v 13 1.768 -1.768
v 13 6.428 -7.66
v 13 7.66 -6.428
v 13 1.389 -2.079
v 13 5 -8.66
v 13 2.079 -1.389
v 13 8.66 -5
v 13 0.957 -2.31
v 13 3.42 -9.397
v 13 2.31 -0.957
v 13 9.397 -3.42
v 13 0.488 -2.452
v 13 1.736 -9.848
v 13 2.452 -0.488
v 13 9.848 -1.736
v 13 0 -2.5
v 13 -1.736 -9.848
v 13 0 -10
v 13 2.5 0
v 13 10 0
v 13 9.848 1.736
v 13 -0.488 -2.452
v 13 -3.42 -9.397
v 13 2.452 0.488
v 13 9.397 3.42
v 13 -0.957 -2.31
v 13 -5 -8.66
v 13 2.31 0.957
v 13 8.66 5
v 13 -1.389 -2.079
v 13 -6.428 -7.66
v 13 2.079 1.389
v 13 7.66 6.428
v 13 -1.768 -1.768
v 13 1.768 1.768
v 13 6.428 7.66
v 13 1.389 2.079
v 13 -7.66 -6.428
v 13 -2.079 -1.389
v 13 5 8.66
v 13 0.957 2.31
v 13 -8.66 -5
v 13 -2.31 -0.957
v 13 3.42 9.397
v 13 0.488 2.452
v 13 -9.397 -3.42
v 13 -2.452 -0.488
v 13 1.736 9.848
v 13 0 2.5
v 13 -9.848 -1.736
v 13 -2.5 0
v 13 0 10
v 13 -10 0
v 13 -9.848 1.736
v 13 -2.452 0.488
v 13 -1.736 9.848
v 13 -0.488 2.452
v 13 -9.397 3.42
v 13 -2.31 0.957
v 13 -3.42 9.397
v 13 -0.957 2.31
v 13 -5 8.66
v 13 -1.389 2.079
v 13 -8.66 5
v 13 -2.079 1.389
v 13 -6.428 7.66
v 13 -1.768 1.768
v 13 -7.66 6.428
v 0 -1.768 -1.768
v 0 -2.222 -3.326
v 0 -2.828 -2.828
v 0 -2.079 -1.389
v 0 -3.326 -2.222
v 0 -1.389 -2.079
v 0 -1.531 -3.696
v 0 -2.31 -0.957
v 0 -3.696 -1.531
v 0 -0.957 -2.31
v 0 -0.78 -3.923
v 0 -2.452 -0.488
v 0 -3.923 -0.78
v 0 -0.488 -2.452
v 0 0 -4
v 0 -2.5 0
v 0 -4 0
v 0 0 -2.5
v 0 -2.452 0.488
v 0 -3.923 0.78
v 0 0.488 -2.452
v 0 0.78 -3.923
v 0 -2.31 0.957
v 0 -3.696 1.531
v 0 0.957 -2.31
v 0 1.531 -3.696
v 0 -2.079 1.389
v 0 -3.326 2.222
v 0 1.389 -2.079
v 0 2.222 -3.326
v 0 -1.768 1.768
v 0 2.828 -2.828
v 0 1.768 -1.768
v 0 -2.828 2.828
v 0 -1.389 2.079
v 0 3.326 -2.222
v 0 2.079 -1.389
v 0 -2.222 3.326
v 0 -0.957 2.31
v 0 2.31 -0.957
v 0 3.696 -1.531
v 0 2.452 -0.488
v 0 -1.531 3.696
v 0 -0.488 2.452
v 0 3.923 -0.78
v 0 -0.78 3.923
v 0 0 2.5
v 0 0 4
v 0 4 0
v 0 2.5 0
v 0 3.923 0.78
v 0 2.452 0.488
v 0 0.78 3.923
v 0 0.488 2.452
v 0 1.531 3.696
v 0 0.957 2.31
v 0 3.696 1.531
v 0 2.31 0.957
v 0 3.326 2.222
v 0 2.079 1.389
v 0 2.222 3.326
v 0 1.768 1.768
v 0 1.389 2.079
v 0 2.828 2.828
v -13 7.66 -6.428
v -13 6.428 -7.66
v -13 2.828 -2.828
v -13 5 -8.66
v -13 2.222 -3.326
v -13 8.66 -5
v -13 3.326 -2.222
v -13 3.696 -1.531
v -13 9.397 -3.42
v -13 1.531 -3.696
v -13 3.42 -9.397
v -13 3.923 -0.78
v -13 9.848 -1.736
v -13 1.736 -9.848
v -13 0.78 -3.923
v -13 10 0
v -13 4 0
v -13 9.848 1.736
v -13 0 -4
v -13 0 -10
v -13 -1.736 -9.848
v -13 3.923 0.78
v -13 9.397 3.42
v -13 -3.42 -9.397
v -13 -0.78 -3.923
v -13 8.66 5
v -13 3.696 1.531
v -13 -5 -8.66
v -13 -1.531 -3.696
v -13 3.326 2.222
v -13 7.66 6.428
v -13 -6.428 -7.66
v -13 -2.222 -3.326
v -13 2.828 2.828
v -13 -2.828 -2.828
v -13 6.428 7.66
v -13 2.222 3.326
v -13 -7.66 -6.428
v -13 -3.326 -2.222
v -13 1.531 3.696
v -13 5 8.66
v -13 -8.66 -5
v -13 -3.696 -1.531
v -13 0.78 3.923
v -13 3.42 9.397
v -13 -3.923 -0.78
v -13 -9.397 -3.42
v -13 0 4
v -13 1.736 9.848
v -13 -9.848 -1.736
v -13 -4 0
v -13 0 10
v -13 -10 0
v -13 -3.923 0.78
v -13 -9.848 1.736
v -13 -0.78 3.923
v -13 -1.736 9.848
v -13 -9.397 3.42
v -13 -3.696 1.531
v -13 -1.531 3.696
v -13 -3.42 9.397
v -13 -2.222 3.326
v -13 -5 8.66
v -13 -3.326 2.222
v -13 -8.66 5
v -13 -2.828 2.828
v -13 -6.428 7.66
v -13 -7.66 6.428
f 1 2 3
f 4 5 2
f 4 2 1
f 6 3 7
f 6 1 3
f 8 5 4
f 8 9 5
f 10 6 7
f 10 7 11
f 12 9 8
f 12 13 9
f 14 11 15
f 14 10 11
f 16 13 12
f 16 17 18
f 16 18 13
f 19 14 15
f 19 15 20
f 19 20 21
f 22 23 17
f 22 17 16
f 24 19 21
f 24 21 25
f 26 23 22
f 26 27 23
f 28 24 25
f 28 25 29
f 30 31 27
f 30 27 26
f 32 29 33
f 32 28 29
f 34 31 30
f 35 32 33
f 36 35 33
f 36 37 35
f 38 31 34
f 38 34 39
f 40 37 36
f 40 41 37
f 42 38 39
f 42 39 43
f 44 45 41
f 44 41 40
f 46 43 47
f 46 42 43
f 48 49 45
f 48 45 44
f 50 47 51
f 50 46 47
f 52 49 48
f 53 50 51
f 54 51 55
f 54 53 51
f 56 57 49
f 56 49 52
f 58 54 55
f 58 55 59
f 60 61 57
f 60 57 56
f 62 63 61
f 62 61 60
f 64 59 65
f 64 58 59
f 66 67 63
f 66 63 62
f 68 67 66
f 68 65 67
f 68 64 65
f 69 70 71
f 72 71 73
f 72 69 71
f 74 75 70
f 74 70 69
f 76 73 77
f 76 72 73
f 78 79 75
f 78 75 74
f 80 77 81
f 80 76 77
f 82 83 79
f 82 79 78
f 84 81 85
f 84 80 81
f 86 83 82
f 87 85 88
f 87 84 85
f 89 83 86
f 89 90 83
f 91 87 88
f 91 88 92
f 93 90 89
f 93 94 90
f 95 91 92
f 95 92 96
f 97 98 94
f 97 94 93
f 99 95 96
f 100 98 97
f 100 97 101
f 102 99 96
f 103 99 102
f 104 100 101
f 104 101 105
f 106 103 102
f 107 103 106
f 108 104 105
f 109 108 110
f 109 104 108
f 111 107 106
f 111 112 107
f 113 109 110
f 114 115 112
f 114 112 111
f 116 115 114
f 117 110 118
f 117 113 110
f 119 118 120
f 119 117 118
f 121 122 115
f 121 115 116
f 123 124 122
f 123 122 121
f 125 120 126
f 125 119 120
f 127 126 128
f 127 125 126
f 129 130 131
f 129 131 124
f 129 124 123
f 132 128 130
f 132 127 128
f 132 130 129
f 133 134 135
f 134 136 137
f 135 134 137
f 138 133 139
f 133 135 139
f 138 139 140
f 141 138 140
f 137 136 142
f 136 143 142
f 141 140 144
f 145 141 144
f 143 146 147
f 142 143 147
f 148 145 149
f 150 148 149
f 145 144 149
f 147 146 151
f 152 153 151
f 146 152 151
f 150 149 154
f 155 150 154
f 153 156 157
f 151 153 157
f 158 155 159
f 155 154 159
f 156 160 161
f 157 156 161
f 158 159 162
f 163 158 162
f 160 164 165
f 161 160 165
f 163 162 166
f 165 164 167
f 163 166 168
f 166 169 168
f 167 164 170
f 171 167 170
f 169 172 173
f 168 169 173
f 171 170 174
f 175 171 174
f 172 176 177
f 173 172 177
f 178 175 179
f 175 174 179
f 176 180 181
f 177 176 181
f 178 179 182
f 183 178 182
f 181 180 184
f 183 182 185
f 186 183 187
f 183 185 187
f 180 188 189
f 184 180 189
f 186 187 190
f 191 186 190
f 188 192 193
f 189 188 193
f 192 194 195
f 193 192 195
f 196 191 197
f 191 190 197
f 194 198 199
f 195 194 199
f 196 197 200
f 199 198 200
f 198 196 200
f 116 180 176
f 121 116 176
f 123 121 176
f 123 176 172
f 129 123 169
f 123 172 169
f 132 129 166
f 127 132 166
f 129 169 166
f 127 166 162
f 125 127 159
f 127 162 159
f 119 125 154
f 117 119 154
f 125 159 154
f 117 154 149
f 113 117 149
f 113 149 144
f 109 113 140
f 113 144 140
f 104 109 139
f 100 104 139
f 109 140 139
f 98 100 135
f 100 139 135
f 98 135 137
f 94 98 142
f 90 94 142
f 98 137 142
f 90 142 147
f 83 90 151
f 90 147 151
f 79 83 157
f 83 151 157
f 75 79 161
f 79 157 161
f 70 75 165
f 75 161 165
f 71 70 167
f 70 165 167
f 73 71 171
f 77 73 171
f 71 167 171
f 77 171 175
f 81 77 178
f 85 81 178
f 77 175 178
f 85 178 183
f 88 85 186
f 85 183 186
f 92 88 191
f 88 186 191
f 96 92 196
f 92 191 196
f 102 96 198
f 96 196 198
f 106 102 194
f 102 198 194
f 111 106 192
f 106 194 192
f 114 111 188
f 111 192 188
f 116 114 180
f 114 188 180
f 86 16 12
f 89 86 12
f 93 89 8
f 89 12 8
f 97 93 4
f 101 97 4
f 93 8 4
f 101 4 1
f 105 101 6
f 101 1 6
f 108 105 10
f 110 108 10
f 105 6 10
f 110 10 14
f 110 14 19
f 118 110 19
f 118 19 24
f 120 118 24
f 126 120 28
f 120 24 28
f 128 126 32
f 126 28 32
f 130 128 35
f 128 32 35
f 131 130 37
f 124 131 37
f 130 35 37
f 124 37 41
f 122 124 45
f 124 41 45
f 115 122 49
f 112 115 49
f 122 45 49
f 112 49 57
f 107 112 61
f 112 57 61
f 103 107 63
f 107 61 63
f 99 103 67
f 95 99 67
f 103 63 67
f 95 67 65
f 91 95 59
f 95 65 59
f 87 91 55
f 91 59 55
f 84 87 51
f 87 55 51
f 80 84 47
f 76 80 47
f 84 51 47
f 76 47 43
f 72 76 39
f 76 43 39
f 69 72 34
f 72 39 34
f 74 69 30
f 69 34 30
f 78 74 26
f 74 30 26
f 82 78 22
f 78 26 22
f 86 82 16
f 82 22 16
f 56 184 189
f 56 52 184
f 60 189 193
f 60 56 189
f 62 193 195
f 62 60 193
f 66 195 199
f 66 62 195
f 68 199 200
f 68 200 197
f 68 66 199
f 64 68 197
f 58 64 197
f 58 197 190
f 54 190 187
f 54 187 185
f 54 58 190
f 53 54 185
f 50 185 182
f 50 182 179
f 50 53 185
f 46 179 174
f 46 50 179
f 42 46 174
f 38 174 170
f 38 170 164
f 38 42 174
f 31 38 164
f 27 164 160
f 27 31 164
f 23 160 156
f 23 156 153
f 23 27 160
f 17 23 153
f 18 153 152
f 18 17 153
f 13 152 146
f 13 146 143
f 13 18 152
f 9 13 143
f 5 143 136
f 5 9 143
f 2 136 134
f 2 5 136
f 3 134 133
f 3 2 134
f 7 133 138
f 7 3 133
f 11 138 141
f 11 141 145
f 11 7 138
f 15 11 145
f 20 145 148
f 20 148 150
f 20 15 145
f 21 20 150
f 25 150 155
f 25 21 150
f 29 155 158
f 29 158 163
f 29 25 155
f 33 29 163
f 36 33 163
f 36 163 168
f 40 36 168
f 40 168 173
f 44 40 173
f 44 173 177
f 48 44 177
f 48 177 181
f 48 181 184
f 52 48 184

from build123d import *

# Parameters (mm, degrees)
SKETCH1_R           = 10
BOSS_EXTRUDE1_DEPTH = 13
SKETCH2_R           = 2.5
CUT_EXTRUDE1_DEPTH  = 13
SKETCH3_R           = 4
CUT_EXTRUDE2_DEPTH  = 13


with BuildPart() as part:
    # Sketch1 → Boss-Extrude1 (new, symmetric)
    with BuildSketch(Plane(origin=(0, 0, 0), x_dir=(0, 0, -1), z_dir=(1, 0, 0))):
        with Locations(Location((0, 0, 0), (0, 0, 180))):
            Circle(SKETCH1_R)
    extrude(amount=BOSS_EXTRUDE1_DEPTH, both=True)

    # Sketch2 → Cut-Extrude1 (cut)
    with BuildSketch(Plane(origin=(13, 0, 0), x_dir=(0, 0, -1), z_dir=(1, 0, 0))):
        Circle(SKETCH2_R)
    extrude(amount=-CUT_EXTRUDE1_DEPTH, mode=Mode.SUBTRACT)

    # Sketch3 → Cut-Extrude2 (cut)
    with BuildSketch(Plane.ZY.offset(13)):
        Circle(SKETCH3_R)
    extrude(amount=-CUT_EXTRUDE2_DEPTH, mode=Mode.SUBTRACT)


solid = part.part
